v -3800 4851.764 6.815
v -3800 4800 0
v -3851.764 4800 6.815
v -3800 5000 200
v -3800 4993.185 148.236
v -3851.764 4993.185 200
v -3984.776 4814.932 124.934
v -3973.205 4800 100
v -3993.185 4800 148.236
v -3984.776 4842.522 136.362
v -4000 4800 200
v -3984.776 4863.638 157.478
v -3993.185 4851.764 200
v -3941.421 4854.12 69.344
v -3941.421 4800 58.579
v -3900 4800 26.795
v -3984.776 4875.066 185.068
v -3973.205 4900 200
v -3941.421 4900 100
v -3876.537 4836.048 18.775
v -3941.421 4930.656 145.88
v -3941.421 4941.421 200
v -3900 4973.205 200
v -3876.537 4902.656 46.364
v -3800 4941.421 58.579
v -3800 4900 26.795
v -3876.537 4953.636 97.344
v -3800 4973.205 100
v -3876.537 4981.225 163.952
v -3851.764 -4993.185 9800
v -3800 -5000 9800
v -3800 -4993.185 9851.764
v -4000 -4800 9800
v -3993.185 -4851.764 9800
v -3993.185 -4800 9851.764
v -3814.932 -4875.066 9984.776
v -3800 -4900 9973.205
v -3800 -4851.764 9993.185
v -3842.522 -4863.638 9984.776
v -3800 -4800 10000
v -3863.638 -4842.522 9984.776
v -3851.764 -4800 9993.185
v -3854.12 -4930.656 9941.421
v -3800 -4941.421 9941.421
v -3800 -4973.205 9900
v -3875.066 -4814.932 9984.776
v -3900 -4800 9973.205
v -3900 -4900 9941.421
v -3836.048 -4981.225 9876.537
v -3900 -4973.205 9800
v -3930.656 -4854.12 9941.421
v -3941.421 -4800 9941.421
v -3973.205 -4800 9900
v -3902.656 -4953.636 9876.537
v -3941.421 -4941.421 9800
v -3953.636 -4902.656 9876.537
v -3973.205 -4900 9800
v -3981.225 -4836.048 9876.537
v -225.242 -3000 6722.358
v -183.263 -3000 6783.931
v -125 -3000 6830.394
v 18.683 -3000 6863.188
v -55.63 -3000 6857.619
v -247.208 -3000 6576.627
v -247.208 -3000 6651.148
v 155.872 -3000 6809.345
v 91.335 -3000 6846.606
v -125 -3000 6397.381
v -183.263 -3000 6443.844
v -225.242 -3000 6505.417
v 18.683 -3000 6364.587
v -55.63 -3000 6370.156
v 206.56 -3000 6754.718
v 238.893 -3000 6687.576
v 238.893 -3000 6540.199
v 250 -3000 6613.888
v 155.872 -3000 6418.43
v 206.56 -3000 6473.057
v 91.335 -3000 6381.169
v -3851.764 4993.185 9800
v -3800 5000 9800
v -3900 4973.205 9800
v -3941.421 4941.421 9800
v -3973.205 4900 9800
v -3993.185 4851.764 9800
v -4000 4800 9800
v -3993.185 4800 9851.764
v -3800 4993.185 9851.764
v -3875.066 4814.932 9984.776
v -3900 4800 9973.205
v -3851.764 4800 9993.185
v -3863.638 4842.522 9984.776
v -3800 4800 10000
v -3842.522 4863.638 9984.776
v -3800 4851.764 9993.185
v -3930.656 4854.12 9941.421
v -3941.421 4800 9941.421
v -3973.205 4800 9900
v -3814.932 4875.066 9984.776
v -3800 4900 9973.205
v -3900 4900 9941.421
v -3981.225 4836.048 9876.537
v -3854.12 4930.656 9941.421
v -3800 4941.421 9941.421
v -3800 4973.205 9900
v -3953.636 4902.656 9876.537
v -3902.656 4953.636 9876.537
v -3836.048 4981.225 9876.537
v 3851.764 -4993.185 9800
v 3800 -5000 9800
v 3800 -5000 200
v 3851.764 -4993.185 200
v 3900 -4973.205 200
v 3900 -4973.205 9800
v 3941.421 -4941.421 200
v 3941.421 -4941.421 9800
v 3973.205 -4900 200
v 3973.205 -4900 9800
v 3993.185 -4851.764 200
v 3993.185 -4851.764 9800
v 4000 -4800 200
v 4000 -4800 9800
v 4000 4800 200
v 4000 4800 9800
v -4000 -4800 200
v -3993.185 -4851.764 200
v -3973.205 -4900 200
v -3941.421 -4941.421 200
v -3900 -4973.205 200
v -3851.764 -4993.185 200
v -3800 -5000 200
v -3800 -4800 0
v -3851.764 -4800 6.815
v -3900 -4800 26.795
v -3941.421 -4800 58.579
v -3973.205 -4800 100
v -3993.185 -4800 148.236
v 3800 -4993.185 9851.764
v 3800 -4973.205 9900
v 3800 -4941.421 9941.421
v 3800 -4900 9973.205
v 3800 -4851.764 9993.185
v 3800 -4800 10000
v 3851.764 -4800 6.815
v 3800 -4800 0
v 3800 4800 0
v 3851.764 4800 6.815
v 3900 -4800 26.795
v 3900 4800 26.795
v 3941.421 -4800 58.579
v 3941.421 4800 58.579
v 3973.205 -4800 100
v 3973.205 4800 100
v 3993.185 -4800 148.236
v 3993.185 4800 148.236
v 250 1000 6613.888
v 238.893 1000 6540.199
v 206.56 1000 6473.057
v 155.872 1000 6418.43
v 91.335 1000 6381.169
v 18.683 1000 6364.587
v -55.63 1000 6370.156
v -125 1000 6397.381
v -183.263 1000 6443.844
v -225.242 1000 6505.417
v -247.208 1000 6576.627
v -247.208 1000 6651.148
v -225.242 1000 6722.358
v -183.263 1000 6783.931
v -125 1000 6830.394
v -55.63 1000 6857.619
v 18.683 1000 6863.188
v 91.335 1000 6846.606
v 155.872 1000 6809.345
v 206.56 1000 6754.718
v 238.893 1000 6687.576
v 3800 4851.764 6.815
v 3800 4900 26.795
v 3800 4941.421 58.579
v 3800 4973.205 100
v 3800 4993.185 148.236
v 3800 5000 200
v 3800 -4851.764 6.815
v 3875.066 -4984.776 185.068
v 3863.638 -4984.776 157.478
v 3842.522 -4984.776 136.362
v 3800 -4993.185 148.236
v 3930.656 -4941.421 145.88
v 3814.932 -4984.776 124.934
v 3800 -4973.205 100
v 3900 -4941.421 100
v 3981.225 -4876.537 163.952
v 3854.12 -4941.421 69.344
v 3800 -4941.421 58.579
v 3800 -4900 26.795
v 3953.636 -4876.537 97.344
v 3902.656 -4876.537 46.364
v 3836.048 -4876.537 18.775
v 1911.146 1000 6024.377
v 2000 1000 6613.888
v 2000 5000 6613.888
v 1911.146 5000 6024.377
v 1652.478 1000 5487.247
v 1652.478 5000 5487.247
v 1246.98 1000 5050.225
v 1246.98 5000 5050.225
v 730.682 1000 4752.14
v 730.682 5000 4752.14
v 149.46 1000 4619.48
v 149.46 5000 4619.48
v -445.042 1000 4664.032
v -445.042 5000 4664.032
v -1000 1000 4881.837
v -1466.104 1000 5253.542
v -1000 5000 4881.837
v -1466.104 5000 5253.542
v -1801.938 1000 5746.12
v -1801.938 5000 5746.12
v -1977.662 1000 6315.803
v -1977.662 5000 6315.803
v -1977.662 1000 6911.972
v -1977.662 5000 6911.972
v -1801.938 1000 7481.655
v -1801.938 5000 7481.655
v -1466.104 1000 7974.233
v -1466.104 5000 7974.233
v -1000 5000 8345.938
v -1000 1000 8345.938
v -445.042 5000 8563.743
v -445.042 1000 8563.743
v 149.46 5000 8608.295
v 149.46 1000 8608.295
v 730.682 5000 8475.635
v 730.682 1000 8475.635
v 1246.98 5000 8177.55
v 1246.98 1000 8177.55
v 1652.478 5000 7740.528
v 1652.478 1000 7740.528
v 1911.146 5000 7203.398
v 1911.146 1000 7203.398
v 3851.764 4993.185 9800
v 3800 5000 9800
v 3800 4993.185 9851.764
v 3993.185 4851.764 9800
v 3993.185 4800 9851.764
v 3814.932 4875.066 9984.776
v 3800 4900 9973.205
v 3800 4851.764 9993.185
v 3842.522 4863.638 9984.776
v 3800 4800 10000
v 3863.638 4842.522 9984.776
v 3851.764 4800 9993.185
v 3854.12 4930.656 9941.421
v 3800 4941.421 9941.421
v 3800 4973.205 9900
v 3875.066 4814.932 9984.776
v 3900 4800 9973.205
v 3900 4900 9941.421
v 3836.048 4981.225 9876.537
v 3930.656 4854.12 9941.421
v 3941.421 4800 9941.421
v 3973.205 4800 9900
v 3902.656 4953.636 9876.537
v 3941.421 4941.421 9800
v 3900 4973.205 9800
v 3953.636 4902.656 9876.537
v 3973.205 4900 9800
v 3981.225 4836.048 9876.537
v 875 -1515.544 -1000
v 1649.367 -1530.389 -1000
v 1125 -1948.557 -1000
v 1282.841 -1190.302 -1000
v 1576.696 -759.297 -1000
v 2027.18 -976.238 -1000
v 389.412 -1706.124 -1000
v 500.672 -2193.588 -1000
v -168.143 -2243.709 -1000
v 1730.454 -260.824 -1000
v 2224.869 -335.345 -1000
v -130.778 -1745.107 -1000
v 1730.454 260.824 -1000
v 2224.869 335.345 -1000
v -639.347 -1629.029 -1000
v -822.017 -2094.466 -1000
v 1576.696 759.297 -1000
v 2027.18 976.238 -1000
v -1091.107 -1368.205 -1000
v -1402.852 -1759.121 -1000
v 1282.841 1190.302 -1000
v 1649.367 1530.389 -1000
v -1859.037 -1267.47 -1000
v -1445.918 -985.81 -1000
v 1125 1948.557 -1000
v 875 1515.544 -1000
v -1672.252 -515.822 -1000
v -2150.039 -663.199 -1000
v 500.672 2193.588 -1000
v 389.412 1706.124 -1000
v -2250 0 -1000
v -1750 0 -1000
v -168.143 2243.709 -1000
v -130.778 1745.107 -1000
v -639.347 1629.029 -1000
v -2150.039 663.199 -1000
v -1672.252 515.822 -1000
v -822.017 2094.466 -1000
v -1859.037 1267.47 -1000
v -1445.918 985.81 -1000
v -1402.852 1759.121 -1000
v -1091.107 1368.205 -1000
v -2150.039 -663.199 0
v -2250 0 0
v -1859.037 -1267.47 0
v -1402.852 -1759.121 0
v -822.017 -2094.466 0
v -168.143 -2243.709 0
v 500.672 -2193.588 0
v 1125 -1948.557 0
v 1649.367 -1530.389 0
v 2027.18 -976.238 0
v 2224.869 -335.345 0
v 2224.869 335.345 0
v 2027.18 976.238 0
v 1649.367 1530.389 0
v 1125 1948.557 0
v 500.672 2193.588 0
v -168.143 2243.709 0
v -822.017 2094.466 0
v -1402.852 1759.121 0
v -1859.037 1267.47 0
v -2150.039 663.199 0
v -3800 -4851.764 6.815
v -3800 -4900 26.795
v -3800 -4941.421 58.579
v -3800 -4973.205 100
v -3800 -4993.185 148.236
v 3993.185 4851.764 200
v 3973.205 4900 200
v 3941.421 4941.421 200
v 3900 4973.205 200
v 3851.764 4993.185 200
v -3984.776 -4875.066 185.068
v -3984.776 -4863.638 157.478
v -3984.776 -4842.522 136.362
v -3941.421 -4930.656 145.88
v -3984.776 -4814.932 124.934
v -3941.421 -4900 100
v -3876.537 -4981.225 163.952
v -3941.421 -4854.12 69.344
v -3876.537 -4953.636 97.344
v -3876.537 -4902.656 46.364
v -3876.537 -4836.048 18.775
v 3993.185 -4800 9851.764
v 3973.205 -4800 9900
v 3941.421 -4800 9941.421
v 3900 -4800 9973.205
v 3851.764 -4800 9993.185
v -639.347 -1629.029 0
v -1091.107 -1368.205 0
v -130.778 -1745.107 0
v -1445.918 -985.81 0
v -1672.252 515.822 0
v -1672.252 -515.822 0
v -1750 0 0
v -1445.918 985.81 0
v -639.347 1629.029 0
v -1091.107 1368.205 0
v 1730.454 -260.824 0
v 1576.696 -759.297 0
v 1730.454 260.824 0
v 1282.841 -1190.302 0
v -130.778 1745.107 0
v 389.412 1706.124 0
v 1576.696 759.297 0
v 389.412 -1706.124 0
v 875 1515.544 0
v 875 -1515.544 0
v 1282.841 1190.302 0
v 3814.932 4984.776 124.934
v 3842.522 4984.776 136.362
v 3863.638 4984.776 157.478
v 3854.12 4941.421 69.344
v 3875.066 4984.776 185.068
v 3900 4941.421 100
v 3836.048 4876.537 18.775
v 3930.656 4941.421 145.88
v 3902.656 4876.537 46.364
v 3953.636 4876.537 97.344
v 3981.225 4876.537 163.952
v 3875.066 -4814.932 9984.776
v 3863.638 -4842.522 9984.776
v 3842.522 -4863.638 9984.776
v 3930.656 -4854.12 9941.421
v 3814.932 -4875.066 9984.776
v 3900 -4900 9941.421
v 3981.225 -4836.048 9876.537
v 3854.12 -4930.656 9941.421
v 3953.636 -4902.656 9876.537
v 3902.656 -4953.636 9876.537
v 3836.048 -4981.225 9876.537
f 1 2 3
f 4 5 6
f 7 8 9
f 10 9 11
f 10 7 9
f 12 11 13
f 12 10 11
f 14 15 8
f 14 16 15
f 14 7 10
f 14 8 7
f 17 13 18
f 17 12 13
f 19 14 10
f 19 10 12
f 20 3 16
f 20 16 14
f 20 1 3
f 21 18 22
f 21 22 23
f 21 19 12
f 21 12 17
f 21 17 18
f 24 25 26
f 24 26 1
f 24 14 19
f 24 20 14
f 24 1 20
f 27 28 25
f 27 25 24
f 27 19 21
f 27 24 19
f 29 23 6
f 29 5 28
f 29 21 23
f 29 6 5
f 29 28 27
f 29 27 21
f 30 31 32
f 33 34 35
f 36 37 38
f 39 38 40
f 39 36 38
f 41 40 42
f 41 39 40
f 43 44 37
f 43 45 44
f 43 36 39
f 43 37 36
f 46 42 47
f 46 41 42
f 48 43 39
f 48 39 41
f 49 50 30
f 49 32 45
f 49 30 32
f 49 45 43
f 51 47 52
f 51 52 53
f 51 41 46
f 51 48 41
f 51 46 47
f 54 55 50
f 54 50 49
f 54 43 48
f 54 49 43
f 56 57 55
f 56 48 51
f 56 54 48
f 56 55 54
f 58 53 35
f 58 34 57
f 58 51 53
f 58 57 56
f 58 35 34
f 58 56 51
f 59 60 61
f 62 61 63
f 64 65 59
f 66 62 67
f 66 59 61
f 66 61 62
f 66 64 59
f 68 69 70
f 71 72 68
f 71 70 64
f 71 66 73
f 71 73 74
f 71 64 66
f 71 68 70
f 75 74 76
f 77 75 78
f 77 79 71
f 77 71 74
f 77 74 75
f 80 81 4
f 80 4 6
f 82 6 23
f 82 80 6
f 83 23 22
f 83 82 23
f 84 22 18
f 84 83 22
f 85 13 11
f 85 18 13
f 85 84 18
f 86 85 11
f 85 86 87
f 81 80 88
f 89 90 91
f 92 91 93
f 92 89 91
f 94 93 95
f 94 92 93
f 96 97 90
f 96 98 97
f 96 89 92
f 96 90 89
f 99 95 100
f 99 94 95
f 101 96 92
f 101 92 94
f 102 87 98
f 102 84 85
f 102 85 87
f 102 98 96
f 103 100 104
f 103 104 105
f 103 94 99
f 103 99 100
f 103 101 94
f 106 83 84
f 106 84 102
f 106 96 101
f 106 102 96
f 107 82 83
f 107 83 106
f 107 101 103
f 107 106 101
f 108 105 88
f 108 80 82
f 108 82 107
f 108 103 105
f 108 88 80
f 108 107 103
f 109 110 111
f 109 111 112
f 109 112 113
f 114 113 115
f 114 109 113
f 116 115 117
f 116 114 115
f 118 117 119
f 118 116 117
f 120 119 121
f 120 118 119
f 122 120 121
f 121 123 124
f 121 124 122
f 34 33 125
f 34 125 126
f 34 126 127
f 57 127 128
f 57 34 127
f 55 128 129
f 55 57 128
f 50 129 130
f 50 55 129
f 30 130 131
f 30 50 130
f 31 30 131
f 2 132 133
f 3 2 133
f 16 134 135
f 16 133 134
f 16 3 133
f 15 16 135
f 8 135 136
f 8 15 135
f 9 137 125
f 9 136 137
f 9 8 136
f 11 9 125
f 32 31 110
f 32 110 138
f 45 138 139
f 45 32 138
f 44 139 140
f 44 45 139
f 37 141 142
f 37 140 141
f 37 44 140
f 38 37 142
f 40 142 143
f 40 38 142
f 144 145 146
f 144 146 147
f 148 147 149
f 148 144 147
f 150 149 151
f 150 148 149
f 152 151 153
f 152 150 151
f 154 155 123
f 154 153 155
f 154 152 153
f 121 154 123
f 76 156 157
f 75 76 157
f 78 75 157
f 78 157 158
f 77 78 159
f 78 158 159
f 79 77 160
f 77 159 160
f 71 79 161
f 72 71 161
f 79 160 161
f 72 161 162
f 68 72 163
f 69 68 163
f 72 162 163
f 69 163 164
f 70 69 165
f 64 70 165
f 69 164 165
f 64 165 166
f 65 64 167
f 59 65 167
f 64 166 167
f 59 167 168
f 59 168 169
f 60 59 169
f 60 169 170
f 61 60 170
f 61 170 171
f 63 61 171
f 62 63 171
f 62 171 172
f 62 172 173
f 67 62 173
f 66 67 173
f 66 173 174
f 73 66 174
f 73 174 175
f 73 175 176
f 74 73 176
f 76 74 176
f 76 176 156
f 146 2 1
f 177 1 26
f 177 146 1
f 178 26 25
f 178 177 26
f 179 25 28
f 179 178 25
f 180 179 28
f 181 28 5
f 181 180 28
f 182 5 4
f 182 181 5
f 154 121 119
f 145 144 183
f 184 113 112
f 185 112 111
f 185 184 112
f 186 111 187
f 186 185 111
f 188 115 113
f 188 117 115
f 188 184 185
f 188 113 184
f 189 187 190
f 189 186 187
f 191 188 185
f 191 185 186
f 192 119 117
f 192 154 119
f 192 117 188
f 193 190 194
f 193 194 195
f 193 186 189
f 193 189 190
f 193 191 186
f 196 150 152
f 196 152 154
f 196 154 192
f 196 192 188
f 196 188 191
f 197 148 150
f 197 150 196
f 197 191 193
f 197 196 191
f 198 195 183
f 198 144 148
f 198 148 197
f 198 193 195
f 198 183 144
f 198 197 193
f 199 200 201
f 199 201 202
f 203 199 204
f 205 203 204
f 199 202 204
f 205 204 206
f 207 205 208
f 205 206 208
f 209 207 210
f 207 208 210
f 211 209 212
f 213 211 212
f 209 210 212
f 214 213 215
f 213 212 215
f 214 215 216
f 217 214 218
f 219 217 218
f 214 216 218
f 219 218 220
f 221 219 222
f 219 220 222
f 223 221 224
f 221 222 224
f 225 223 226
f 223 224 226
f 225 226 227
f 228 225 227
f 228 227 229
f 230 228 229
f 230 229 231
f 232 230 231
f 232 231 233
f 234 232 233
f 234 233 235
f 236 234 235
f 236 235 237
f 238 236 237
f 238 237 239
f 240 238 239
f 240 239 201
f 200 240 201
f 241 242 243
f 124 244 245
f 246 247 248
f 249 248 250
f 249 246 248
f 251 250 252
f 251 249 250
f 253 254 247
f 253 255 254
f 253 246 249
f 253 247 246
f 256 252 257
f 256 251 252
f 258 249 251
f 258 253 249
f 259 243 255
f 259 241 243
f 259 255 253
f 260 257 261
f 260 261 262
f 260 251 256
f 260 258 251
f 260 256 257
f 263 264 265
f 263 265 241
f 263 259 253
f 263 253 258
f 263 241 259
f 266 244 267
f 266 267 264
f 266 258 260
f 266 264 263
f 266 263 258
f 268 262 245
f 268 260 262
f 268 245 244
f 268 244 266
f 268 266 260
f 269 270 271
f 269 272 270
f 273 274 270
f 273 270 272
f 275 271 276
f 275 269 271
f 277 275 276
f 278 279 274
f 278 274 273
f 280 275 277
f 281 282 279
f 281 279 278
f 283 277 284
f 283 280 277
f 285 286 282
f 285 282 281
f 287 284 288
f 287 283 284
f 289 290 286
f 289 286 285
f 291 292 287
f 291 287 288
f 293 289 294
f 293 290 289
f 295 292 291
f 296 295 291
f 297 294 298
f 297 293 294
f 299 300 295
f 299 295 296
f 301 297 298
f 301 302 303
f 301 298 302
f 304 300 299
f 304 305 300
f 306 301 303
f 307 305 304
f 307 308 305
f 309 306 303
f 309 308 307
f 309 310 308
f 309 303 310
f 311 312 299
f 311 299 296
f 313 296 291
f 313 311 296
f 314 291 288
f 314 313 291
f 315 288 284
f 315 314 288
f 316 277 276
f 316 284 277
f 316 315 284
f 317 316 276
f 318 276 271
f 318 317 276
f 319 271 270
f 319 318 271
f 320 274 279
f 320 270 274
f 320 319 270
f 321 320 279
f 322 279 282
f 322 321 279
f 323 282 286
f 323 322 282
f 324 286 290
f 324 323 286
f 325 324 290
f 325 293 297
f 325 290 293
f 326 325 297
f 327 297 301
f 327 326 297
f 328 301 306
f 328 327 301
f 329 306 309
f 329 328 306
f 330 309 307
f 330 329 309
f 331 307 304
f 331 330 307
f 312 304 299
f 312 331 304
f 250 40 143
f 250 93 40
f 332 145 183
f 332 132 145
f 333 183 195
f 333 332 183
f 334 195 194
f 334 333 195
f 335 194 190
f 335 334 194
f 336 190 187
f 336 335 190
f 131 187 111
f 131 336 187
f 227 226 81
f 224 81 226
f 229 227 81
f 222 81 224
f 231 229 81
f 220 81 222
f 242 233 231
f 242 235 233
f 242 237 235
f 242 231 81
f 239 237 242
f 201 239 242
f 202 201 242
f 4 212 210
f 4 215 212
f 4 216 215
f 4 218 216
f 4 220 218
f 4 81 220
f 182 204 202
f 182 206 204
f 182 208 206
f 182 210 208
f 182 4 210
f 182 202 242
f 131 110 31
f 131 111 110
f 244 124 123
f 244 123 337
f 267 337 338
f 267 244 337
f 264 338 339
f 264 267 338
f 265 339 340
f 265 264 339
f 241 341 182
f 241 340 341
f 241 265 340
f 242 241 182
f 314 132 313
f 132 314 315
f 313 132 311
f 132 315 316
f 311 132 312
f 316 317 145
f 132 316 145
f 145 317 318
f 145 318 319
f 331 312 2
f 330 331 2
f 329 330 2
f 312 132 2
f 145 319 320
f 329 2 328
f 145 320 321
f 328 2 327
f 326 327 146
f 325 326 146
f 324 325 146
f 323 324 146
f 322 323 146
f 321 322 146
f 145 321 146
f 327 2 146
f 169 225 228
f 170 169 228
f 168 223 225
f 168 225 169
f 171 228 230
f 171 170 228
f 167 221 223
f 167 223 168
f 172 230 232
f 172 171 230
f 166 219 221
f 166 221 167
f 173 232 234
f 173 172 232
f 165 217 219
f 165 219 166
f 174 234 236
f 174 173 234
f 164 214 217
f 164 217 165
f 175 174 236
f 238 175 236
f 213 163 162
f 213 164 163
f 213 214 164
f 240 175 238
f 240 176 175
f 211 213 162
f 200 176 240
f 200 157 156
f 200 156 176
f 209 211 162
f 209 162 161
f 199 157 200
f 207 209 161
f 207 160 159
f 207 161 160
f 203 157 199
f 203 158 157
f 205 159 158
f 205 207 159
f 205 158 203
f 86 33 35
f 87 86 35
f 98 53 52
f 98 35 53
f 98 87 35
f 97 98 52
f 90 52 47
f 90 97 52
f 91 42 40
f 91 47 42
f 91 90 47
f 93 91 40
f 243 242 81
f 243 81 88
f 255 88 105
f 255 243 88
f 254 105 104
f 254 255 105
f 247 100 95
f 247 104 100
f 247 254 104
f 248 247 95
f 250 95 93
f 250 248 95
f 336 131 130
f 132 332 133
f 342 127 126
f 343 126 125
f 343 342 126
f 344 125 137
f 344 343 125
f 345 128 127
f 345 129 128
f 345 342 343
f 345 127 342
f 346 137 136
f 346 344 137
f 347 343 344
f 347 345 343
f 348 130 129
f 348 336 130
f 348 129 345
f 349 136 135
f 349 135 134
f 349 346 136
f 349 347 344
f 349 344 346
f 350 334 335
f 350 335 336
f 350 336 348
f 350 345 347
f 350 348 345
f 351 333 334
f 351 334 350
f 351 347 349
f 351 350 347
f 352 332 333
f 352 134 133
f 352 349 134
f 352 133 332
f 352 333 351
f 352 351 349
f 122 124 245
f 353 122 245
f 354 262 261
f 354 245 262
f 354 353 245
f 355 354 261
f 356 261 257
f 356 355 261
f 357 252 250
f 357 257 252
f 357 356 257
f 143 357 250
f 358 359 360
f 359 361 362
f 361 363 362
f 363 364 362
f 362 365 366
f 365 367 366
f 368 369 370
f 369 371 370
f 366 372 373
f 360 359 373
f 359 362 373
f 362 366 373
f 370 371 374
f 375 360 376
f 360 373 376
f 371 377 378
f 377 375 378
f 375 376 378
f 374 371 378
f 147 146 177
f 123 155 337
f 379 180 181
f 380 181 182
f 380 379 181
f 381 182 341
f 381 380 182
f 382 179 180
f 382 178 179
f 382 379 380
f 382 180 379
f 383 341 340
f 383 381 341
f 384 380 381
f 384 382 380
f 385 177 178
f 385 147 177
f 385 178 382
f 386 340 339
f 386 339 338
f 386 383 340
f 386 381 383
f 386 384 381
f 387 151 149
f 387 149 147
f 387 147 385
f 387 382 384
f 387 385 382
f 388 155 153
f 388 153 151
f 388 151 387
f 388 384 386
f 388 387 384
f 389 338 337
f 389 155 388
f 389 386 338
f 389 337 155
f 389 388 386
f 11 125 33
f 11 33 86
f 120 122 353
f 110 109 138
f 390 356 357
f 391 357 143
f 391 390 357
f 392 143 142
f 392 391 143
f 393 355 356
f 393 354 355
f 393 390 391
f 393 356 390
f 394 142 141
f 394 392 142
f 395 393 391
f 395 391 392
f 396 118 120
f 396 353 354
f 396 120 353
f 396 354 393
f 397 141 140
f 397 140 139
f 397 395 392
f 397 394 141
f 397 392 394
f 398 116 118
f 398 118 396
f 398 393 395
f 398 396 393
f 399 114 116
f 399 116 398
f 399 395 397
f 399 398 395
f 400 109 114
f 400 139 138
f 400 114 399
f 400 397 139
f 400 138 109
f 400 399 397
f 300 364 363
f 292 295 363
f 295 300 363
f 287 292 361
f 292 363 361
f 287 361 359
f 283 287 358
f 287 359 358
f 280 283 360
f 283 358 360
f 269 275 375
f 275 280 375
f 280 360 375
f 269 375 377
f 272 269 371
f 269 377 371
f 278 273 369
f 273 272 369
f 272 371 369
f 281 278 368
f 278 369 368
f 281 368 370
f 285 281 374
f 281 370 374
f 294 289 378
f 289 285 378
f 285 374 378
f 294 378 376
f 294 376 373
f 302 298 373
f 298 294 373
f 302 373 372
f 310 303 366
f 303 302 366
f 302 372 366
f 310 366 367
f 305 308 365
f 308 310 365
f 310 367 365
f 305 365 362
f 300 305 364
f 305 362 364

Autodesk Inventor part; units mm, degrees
ref_plane "YZ Plane" through (0, 0, 0) normal (1, 0, 0) x (0, 1, 0)
ref_plane "XZ Plane" through (0, 0, 0) normal (0, 1, 0) x (-1, 0, 0)
ref_plane "XY Plane" through (0, 0, 0) normal (0, 0, 1) x (1, 0, 0)
sketch "Sketch1" plane through (0, 0, 0) normal (0, 0, 1) x (1, 0, 0)
  line L0 (4000, 5000) -> (4000, -5000)
  line L1 (4000, -5000) -> (-4000, -5000)
  line L2 (-4000, -5000) -> (-4000, 5000)
  line L3 (-4000, 5000) -> (4000, 5000)
  line L4 (4000, 5000) -> (-4000, -5000) construction
  line L5 (4000, -5000) -> (-4000, 5000) construction
  point P0 (0, 0)
  dimension "d0" = 10000
  dimension "d1" = 8000
extrude "Extrusion1" add sketch "Sketch1" along normal blind 10000
fillet "Fillet1" radius 200 12 edges at (4000, 0, 0) (0, -5000, 0) (4000, -5000, 5000) (4000, 5000, 5000) (0, 5000, 0) (-4000, 5000, 5000) (-4000, 0, 0) (-4000, -5000, 5000) (0, -5000, 10000) (-4000, 0, 10000) (4000, 0, 10000) (0, 5000, 10000)
sketch "Sketch2" plane through (0, 0, 0) normal (0, 0, -1) x (-1, 0, 0)
  circle A0 centre (0, 0) radius 1750 projected
  circle A1 centre (0, 0) radius 2250
  point P0 (0, 0)
  dimension "d5" = 4500
extrude "Extrusion2" add sketch "Sketch2" along normal blind 1000
sketch "Sketch3" plane through (-3800, 5000, 9800) normal (0, 1, 0) x (1, 0, 0)
  circle A0 centre (3800, 3186.1125) radius 2000
  point P0 (3800, 9800)
  dimension "d8" = 4000
extrude "Extrusion3" cut sketch "Sketch3" against normal blind 4000
sketch "Sketch4" plane through (0, 1000, 6613.8875) normal (0, 1, 0) x (1, 0, 0)
  circle A0 centre (0, 0) radius 250
  point P0 (0, 6613.8875)
  dimension "d12" = 500
extrude "Extrusion4" cut sketch "Sketch4" against normal blind 4000
properties part number "transmission box"
